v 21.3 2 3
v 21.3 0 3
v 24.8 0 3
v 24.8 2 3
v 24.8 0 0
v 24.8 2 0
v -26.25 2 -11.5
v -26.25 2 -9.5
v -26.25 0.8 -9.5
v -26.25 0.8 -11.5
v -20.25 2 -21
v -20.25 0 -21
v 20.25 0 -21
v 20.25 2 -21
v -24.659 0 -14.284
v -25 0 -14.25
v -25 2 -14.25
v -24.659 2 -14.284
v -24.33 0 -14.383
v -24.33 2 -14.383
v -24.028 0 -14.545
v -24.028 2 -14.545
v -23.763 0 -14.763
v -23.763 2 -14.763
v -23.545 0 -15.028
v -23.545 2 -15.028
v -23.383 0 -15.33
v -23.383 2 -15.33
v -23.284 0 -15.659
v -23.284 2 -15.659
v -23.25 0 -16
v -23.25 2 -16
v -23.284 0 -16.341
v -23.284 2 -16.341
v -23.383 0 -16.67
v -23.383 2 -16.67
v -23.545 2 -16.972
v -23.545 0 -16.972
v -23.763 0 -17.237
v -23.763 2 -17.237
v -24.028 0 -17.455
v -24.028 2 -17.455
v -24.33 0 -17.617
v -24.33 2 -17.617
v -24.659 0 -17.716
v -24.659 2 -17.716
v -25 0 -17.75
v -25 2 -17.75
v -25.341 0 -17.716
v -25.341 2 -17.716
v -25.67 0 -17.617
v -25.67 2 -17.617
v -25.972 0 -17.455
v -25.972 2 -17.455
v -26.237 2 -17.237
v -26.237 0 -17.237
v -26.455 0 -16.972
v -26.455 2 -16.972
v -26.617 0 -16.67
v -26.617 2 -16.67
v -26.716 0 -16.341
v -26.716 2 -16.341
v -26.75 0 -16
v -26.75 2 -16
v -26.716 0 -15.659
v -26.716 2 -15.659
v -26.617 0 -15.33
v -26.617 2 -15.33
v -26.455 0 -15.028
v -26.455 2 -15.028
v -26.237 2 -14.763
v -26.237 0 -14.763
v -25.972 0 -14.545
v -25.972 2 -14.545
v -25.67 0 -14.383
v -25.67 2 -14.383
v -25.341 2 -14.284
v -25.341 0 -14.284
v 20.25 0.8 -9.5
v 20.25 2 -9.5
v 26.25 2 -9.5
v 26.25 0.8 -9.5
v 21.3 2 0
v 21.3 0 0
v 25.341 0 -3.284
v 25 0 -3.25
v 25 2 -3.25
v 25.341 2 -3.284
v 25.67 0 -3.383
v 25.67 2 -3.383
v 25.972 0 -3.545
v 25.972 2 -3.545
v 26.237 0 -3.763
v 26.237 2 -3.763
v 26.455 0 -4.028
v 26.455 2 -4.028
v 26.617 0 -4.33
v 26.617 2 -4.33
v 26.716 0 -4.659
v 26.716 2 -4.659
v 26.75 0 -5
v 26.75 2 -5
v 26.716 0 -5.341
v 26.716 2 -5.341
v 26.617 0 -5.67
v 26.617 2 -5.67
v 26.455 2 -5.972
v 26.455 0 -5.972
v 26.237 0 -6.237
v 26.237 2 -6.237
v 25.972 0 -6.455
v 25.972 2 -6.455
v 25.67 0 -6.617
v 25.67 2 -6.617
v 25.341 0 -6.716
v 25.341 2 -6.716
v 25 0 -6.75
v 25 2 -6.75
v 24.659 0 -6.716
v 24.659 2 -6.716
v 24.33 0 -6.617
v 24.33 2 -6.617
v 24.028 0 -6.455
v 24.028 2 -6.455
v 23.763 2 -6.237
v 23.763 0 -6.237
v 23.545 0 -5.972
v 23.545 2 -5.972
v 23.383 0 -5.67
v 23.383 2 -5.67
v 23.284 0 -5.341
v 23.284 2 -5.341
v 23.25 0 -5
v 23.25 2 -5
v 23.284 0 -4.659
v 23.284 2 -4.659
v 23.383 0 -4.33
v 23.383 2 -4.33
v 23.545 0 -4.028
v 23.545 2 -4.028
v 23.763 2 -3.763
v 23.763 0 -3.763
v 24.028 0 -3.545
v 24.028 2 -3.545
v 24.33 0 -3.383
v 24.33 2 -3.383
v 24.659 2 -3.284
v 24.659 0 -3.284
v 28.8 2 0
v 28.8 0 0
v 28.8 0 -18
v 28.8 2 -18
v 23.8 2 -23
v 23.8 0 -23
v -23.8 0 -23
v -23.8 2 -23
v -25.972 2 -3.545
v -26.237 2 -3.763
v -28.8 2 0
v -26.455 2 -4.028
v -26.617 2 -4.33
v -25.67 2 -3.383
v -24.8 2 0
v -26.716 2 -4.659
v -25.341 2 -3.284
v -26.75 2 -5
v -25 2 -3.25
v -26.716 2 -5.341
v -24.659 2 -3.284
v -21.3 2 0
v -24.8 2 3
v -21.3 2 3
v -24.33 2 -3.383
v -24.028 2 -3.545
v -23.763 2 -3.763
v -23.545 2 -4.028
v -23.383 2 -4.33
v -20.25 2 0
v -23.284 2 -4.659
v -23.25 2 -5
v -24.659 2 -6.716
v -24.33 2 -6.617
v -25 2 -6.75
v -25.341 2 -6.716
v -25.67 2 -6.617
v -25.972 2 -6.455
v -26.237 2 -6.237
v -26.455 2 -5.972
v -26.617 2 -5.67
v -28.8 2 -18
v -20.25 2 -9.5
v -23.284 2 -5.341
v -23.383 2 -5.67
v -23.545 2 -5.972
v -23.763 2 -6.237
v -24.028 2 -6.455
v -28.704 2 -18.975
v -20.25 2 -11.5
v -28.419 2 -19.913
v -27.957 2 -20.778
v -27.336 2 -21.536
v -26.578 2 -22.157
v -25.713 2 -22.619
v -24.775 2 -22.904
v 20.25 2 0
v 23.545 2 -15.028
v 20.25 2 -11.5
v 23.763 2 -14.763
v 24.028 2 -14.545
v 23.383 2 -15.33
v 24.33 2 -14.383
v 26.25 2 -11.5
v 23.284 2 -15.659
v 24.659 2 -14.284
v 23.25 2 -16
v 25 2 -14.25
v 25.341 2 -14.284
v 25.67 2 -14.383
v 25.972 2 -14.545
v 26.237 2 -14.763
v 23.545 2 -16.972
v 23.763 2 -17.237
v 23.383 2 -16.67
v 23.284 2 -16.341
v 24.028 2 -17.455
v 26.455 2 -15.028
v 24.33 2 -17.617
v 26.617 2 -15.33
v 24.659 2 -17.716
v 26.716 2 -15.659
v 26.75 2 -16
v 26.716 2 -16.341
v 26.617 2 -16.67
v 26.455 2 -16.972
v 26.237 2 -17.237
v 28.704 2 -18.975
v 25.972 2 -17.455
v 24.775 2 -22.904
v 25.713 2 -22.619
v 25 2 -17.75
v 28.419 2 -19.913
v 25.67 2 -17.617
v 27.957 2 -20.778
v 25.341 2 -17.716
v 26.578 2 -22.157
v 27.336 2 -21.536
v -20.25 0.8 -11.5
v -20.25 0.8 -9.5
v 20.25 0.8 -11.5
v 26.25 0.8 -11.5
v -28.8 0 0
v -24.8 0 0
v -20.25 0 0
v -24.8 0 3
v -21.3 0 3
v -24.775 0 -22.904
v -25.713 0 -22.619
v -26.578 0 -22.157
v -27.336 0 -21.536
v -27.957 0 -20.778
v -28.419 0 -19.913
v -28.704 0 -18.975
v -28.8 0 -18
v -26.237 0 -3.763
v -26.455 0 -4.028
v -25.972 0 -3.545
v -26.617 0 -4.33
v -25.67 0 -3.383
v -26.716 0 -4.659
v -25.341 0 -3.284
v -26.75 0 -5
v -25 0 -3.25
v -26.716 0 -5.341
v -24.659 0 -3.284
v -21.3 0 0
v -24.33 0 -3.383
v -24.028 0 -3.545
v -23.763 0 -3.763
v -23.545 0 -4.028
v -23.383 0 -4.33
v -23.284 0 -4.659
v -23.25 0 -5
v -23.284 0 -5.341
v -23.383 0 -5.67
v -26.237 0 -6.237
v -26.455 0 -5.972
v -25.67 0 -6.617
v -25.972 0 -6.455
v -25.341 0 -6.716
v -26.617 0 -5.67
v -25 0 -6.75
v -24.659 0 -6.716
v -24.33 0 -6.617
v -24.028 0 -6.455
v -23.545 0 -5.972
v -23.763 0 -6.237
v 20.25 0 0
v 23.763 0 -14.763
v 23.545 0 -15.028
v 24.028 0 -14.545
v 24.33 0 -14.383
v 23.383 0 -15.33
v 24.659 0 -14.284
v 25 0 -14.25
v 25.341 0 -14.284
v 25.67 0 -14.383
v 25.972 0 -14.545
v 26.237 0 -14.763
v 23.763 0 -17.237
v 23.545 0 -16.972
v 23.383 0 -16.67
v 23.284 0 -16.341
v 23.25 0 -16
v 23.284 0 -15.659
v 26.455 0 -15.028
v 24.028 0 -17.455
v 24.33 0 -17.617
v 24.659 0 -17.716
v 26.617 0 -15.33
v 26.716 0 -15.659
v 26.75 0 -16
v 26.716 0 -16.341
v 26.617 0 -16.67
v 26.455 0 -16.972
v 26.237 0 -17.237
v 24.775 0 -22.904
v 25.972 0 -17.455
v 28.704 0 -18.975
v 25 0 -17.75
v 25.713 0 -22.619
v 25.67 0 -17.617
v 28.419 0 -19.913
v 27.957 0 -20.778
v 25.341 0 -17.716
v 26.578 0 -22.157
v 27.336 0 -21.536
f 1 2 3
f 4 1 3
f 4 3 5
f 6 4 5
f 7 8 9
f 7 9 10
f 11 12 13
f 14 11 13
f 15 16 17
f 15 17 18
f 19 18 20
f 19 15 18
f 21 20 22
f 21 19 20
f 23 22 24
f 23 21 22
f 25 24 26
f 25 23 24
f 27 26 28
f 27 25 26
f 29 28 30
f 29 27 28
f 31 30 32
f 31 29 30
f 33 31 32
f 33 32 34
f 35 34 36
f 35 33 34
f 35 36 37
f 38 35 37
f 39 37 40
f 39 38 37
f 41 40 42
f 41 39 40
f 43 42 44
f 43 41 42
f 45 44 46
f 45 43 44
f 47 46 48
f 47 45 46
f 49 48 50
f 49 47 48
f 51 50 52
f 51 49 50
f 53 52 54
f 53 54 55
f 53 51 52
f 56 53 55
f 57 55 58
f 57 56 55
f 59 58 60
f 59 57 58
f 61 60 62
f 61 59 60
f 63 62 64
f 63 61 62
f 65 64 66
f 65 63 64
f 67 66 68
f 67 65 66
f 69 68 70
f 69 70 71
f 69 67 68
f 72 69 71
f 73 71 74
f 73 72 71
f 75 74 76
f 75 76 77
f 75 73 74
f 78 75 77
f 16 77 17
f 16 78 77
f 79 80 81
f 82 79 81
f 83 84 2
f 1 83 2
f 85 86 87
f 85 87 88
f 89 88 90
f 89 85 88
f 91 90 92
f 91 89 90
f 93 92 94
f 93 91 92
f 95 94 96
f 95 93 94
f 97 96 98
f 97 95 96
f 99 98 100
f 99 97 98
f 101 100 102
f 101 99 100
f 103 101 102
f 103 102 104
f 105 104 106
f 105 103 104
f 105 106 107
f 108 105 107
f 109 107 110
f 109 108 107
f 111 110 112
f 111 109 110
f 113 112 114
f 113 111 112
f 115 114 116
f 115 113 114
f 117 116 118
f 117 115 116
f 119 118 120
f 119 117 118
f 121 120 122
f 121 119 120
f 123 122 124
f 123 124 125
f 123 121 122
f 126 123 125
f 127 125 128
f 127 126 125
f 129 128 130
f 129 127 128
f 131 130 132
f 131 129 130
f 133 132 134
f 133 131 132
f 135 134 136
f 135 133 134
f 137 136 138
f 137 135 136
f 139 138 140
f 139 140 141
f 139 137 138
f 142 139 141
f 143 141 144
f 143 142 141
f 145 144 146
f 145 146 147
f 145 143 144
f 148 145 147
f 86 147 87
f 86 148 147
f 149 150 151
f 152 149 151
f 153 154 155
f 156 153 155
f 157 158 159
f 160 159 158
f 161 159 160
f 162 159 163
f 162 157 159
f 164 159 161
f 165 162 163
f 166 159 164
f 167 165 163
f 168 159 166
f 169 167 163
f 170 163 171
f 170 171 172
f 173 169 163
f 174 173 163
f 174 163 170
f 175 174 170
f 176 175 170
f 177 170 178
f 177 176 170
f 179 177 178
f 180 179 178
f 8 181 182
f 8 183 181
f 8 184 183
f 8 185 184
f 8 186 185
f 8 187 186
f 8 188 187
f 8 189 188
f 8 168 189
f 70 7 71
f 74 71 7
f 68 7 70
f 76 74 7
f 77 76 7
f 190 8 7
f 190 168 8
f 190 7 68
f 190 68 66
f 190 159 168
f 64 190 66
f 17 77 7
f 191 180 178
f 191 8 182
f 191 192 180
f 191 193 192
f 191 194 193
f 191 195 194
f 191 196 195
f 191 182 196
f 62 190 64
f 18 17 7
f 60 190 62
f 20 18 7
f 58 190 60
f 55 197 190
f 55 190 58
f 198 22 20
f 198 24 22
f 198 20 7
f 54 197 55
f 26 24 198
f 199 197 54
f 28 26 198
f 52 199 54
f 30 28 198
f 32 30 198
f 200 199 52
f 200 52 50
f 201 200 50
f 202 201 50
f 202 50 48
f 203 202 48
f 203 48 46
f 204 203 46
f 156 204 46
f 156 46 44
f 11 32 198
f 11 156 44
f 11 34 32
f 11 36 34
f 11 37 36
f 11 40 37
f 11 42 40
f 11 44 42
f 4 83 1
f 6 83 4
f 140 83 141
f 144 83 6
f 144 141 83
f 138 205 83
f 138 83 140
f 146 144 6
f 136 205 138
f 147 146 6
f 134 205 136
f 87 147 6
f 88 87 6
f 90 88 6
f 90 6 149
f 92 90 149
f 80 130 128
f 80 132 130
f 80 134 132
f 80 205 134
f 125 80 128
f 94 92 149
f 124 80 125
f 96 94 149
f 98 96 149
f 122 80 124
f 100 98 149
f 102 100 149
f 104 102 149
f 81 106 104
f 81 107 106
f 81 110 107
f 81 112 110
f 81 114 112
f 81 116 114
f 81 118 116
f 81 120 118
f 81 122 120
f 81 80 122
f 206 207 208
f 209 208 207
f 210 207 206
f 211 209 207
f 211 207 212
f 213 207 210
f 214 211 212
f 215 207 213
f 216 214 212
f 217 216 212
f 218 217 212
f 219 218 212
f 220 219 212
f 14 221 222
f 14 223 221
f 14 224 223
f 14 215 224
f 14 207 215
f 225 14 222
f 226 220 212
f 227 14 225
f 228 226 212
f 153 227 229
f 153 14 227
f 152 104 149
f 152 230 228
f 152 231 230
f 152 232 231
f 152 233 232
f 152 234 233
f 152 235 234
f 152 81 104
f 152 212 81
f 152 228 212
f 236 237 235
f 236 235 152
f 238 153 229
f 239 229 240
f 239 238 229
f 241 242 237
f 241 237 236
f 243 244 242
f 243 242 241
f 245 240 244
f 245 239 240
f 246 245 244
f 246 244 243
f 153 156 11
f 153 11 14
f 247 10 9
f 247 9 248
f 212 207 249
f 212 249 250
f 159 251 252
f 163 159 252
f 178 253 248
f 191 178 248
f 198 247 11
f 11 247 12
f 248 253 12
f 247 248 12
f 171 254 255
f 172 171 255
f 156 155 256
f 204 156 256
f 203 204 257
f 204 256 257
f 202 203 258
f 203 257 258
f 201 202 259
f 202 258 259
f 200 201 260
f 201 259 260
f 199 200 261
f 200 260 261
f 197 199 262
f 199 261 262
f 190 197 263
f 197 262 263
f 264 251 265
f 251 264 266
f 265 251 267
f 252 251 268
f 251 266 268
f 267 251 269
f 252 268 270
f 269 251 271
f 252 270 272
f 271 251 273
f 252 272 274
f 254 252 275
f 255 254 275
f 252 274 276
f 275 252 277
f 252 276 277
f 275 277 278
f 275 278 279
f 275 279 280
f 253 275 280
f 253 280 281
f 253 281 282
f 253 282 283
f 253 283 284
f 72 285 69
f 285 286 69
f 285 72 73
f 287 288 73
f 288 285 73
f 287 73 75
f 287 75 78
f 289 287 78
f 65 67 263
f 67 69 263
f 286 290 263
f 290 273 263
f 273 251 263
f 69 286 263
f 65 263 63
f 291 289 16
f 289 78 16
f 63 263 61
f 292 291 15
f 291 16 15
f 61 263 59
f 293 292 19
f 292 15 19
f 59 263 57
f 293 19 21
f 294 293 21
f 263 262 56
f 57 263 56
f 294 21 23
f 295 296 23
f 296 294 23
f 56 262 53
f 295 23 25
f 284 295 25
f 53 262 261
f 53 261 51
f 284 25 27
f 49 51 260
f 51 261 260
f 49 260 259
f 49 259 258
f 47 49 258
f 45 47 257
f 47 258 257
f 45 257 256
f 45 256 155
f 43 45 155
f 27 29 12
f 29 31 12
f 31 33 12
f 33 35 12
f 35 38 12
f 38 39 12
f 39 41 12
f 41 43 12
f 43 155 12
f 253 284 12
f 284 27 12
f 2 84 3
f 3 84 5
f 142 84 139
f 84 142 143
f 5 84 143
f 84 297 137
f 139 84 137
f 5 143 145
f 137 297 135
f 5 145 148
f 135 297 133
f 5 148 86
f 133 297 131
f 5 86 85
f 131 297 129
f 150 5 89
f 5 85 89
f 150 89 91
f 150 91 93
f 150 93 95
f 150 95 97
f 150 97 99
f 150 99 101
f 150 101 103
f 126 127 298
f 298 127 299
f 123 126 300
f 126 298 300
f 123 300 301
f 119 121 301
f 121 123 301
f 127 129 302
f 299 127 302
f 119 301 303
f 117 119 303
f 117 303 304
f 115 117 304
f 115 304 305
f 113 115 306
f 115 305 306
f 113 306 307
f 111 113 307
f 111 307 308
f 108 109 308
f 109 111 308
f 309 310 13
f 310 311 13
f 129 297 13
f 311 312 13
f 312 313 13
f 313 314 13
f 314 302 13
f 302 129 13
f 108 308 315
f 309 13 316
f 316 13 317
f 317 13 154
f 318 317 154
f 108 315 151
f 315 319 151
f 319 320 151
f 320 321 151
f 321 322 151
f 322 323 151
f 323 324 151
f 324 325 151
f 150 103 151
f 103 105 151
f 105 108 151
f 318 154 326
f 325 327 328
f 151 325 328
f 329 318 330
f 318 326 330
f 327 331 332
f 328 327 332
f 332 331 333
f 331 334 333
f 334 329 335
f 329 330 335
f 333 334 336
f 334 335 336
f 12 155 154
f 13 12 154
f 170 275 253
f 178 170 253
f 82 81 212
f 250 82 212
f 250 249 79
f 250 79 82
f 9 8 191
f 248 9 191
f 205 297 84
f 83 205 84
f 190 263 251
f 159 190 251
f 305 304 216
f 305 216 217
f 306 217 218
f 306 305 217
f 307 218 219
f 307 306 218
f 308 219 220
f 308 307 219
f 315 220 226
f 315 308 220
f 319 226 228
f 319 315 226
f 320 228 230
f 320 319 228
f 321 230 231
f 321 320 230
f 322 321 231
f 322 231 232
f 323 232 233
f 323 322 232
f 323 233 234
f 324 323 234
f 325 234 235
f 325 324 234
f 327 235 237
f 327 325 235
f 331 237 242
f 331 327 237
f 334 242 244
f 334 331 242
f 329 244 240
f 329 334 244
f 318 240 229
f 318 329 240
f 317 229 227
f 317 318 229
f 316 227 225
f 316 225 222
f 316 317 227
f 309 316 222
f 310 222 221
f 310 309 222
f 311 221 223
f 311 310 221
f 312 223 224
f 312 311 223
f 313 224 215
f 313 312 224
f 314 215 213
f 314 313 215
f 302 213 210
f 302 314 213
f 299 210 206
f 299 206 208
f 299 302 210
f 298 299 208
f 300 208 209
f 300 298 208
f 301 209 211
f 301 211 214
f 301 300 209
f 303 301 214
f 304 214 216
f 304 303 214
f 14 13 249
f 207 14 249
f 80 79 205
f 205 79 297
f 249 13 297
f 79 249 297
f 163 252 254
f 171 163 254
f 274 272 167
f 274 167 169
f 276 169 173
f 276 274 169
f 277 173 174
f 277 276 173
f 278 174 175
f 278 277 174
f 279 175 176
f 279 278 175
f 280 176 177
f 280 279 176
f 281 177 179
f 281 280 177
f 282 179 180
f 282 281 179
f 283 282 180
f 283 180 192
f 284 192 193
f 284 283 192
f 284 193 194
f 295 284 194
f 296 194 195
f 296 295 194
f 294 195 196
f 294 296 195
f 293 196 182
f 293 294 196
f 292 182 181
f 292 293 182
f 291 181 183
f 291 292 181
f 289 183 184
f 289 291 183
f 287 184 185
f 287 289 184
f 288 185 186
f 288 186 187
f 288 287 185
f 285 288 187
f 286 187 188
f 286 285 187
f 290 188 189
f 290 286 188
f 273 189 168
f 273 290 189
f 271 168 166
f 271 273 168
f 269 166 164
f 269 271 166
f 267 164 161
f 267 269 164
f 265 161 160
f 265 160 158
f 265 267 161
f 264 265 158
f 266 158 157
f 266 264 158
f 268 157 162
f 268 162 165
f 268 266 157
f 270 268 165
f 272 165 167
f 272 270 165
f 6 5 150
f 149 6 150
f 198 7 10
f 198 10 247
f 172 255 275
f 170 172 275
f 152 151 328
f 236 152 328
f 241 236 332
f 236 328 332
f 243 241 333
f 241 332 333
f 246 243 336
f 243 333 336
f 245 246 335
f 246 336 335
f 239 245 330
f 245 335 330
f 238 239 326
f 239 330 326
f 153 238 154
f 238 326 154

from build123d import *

# Parameters (mm, degrees)
CROQUIS1_R              = 1.75
SALIENTE_EXTRUIR1_DEPTH = 2
CROQUIS2_W              = 6
CROQUIS2_H              = 2
CORTAR_EXTRUIR1_DEPTH   = 1.2


with BuildPart() as part:
    # Croquis1 → Saliente-Extruir1 (new body)
    with BuildSketch(Plane(origin=(0, 0, 0), x_dir=(1, 0, 0), z_dir=(0, 1, 0))):
        with BuildLine():
            Line((-20.25, 0), (-20.25, 21))
            Line((-20.25, 21), (20.25, 21))
            Line((20.25, 21), (20.25, 0))
            Line((20.25, 0), (21.3, 0))
            Line((21.3, 0), (21.3, -3))
            Line((21.3, -3), (24.8, -3))
            Line((24.8, -3), (24.8, 0))
            Line((24.8, 0), (28.8, 0))
            Line((28.8, 0), (28.8, 18))
            ThreePointArc((28.8, 18), (27.335533906, 21.535533906), (23.8, 23))
            Line((23.8, 23), (-23.8, 23))
            ThreePointArc((-23.8, 23), (-27.335533906, 21.535533906), (-28.8, 18))
            Line((-28.8, 18), (-28.8, 0))
            Line((-28.8, 0), (-24.8, 0))
            Line((-24.8, 0), (-24.8, -3))
            Line((-24.8, -3), (-21.3, -3))
            Line((-21.3, -3), (-21.3, 0))
            Line((-21.3, 0), (-20.25, 0))
        make_face()
        with Locations(Location((-25, 5, 0), (0, 0, 270))):
            Circle(CROQUIS1_R, mode=Mode.SUBTRACT)
        with Locations(Location((25, 5, 0), (0, 0, 270))):
            Circle(CROQUIS1_R, mode=Mode.SUBTRACT)
        with Locations(Location((25, 16, 0), (0, 0, 270))):
            Circle(CROQUIS1_R, mode=Mode.SUBTRACT)
        with Locations(Location((-25, 16, 0), (0, 0, 270))):
            Circle(CROQUIS1_R, mode=Mode.SUBTRACT)
    extrude(amount=SALIENTE_EXTRUIR1_DEPTH)

    # Croquis2 → Cortar-Extruir1 (cut)
    with BuildSketch(Plane(origin=(0, 2, 0), x_dir=(1, 0, 0), z_dir=(0, 1, 0))):
        with Locations((-23.25, 10.5)):
            Rectangle(CROQUIS2_W, CROQUIS2_H)
        with Locations((23.25, 10.5)):
            Rectangle(CROQUIS2_W, CROQUIS2_H)
    extrude(amount=-CORTAR_EXTRUIR1_DEPTH, mode=Mode.SUBTRACT)


solid = part.part
